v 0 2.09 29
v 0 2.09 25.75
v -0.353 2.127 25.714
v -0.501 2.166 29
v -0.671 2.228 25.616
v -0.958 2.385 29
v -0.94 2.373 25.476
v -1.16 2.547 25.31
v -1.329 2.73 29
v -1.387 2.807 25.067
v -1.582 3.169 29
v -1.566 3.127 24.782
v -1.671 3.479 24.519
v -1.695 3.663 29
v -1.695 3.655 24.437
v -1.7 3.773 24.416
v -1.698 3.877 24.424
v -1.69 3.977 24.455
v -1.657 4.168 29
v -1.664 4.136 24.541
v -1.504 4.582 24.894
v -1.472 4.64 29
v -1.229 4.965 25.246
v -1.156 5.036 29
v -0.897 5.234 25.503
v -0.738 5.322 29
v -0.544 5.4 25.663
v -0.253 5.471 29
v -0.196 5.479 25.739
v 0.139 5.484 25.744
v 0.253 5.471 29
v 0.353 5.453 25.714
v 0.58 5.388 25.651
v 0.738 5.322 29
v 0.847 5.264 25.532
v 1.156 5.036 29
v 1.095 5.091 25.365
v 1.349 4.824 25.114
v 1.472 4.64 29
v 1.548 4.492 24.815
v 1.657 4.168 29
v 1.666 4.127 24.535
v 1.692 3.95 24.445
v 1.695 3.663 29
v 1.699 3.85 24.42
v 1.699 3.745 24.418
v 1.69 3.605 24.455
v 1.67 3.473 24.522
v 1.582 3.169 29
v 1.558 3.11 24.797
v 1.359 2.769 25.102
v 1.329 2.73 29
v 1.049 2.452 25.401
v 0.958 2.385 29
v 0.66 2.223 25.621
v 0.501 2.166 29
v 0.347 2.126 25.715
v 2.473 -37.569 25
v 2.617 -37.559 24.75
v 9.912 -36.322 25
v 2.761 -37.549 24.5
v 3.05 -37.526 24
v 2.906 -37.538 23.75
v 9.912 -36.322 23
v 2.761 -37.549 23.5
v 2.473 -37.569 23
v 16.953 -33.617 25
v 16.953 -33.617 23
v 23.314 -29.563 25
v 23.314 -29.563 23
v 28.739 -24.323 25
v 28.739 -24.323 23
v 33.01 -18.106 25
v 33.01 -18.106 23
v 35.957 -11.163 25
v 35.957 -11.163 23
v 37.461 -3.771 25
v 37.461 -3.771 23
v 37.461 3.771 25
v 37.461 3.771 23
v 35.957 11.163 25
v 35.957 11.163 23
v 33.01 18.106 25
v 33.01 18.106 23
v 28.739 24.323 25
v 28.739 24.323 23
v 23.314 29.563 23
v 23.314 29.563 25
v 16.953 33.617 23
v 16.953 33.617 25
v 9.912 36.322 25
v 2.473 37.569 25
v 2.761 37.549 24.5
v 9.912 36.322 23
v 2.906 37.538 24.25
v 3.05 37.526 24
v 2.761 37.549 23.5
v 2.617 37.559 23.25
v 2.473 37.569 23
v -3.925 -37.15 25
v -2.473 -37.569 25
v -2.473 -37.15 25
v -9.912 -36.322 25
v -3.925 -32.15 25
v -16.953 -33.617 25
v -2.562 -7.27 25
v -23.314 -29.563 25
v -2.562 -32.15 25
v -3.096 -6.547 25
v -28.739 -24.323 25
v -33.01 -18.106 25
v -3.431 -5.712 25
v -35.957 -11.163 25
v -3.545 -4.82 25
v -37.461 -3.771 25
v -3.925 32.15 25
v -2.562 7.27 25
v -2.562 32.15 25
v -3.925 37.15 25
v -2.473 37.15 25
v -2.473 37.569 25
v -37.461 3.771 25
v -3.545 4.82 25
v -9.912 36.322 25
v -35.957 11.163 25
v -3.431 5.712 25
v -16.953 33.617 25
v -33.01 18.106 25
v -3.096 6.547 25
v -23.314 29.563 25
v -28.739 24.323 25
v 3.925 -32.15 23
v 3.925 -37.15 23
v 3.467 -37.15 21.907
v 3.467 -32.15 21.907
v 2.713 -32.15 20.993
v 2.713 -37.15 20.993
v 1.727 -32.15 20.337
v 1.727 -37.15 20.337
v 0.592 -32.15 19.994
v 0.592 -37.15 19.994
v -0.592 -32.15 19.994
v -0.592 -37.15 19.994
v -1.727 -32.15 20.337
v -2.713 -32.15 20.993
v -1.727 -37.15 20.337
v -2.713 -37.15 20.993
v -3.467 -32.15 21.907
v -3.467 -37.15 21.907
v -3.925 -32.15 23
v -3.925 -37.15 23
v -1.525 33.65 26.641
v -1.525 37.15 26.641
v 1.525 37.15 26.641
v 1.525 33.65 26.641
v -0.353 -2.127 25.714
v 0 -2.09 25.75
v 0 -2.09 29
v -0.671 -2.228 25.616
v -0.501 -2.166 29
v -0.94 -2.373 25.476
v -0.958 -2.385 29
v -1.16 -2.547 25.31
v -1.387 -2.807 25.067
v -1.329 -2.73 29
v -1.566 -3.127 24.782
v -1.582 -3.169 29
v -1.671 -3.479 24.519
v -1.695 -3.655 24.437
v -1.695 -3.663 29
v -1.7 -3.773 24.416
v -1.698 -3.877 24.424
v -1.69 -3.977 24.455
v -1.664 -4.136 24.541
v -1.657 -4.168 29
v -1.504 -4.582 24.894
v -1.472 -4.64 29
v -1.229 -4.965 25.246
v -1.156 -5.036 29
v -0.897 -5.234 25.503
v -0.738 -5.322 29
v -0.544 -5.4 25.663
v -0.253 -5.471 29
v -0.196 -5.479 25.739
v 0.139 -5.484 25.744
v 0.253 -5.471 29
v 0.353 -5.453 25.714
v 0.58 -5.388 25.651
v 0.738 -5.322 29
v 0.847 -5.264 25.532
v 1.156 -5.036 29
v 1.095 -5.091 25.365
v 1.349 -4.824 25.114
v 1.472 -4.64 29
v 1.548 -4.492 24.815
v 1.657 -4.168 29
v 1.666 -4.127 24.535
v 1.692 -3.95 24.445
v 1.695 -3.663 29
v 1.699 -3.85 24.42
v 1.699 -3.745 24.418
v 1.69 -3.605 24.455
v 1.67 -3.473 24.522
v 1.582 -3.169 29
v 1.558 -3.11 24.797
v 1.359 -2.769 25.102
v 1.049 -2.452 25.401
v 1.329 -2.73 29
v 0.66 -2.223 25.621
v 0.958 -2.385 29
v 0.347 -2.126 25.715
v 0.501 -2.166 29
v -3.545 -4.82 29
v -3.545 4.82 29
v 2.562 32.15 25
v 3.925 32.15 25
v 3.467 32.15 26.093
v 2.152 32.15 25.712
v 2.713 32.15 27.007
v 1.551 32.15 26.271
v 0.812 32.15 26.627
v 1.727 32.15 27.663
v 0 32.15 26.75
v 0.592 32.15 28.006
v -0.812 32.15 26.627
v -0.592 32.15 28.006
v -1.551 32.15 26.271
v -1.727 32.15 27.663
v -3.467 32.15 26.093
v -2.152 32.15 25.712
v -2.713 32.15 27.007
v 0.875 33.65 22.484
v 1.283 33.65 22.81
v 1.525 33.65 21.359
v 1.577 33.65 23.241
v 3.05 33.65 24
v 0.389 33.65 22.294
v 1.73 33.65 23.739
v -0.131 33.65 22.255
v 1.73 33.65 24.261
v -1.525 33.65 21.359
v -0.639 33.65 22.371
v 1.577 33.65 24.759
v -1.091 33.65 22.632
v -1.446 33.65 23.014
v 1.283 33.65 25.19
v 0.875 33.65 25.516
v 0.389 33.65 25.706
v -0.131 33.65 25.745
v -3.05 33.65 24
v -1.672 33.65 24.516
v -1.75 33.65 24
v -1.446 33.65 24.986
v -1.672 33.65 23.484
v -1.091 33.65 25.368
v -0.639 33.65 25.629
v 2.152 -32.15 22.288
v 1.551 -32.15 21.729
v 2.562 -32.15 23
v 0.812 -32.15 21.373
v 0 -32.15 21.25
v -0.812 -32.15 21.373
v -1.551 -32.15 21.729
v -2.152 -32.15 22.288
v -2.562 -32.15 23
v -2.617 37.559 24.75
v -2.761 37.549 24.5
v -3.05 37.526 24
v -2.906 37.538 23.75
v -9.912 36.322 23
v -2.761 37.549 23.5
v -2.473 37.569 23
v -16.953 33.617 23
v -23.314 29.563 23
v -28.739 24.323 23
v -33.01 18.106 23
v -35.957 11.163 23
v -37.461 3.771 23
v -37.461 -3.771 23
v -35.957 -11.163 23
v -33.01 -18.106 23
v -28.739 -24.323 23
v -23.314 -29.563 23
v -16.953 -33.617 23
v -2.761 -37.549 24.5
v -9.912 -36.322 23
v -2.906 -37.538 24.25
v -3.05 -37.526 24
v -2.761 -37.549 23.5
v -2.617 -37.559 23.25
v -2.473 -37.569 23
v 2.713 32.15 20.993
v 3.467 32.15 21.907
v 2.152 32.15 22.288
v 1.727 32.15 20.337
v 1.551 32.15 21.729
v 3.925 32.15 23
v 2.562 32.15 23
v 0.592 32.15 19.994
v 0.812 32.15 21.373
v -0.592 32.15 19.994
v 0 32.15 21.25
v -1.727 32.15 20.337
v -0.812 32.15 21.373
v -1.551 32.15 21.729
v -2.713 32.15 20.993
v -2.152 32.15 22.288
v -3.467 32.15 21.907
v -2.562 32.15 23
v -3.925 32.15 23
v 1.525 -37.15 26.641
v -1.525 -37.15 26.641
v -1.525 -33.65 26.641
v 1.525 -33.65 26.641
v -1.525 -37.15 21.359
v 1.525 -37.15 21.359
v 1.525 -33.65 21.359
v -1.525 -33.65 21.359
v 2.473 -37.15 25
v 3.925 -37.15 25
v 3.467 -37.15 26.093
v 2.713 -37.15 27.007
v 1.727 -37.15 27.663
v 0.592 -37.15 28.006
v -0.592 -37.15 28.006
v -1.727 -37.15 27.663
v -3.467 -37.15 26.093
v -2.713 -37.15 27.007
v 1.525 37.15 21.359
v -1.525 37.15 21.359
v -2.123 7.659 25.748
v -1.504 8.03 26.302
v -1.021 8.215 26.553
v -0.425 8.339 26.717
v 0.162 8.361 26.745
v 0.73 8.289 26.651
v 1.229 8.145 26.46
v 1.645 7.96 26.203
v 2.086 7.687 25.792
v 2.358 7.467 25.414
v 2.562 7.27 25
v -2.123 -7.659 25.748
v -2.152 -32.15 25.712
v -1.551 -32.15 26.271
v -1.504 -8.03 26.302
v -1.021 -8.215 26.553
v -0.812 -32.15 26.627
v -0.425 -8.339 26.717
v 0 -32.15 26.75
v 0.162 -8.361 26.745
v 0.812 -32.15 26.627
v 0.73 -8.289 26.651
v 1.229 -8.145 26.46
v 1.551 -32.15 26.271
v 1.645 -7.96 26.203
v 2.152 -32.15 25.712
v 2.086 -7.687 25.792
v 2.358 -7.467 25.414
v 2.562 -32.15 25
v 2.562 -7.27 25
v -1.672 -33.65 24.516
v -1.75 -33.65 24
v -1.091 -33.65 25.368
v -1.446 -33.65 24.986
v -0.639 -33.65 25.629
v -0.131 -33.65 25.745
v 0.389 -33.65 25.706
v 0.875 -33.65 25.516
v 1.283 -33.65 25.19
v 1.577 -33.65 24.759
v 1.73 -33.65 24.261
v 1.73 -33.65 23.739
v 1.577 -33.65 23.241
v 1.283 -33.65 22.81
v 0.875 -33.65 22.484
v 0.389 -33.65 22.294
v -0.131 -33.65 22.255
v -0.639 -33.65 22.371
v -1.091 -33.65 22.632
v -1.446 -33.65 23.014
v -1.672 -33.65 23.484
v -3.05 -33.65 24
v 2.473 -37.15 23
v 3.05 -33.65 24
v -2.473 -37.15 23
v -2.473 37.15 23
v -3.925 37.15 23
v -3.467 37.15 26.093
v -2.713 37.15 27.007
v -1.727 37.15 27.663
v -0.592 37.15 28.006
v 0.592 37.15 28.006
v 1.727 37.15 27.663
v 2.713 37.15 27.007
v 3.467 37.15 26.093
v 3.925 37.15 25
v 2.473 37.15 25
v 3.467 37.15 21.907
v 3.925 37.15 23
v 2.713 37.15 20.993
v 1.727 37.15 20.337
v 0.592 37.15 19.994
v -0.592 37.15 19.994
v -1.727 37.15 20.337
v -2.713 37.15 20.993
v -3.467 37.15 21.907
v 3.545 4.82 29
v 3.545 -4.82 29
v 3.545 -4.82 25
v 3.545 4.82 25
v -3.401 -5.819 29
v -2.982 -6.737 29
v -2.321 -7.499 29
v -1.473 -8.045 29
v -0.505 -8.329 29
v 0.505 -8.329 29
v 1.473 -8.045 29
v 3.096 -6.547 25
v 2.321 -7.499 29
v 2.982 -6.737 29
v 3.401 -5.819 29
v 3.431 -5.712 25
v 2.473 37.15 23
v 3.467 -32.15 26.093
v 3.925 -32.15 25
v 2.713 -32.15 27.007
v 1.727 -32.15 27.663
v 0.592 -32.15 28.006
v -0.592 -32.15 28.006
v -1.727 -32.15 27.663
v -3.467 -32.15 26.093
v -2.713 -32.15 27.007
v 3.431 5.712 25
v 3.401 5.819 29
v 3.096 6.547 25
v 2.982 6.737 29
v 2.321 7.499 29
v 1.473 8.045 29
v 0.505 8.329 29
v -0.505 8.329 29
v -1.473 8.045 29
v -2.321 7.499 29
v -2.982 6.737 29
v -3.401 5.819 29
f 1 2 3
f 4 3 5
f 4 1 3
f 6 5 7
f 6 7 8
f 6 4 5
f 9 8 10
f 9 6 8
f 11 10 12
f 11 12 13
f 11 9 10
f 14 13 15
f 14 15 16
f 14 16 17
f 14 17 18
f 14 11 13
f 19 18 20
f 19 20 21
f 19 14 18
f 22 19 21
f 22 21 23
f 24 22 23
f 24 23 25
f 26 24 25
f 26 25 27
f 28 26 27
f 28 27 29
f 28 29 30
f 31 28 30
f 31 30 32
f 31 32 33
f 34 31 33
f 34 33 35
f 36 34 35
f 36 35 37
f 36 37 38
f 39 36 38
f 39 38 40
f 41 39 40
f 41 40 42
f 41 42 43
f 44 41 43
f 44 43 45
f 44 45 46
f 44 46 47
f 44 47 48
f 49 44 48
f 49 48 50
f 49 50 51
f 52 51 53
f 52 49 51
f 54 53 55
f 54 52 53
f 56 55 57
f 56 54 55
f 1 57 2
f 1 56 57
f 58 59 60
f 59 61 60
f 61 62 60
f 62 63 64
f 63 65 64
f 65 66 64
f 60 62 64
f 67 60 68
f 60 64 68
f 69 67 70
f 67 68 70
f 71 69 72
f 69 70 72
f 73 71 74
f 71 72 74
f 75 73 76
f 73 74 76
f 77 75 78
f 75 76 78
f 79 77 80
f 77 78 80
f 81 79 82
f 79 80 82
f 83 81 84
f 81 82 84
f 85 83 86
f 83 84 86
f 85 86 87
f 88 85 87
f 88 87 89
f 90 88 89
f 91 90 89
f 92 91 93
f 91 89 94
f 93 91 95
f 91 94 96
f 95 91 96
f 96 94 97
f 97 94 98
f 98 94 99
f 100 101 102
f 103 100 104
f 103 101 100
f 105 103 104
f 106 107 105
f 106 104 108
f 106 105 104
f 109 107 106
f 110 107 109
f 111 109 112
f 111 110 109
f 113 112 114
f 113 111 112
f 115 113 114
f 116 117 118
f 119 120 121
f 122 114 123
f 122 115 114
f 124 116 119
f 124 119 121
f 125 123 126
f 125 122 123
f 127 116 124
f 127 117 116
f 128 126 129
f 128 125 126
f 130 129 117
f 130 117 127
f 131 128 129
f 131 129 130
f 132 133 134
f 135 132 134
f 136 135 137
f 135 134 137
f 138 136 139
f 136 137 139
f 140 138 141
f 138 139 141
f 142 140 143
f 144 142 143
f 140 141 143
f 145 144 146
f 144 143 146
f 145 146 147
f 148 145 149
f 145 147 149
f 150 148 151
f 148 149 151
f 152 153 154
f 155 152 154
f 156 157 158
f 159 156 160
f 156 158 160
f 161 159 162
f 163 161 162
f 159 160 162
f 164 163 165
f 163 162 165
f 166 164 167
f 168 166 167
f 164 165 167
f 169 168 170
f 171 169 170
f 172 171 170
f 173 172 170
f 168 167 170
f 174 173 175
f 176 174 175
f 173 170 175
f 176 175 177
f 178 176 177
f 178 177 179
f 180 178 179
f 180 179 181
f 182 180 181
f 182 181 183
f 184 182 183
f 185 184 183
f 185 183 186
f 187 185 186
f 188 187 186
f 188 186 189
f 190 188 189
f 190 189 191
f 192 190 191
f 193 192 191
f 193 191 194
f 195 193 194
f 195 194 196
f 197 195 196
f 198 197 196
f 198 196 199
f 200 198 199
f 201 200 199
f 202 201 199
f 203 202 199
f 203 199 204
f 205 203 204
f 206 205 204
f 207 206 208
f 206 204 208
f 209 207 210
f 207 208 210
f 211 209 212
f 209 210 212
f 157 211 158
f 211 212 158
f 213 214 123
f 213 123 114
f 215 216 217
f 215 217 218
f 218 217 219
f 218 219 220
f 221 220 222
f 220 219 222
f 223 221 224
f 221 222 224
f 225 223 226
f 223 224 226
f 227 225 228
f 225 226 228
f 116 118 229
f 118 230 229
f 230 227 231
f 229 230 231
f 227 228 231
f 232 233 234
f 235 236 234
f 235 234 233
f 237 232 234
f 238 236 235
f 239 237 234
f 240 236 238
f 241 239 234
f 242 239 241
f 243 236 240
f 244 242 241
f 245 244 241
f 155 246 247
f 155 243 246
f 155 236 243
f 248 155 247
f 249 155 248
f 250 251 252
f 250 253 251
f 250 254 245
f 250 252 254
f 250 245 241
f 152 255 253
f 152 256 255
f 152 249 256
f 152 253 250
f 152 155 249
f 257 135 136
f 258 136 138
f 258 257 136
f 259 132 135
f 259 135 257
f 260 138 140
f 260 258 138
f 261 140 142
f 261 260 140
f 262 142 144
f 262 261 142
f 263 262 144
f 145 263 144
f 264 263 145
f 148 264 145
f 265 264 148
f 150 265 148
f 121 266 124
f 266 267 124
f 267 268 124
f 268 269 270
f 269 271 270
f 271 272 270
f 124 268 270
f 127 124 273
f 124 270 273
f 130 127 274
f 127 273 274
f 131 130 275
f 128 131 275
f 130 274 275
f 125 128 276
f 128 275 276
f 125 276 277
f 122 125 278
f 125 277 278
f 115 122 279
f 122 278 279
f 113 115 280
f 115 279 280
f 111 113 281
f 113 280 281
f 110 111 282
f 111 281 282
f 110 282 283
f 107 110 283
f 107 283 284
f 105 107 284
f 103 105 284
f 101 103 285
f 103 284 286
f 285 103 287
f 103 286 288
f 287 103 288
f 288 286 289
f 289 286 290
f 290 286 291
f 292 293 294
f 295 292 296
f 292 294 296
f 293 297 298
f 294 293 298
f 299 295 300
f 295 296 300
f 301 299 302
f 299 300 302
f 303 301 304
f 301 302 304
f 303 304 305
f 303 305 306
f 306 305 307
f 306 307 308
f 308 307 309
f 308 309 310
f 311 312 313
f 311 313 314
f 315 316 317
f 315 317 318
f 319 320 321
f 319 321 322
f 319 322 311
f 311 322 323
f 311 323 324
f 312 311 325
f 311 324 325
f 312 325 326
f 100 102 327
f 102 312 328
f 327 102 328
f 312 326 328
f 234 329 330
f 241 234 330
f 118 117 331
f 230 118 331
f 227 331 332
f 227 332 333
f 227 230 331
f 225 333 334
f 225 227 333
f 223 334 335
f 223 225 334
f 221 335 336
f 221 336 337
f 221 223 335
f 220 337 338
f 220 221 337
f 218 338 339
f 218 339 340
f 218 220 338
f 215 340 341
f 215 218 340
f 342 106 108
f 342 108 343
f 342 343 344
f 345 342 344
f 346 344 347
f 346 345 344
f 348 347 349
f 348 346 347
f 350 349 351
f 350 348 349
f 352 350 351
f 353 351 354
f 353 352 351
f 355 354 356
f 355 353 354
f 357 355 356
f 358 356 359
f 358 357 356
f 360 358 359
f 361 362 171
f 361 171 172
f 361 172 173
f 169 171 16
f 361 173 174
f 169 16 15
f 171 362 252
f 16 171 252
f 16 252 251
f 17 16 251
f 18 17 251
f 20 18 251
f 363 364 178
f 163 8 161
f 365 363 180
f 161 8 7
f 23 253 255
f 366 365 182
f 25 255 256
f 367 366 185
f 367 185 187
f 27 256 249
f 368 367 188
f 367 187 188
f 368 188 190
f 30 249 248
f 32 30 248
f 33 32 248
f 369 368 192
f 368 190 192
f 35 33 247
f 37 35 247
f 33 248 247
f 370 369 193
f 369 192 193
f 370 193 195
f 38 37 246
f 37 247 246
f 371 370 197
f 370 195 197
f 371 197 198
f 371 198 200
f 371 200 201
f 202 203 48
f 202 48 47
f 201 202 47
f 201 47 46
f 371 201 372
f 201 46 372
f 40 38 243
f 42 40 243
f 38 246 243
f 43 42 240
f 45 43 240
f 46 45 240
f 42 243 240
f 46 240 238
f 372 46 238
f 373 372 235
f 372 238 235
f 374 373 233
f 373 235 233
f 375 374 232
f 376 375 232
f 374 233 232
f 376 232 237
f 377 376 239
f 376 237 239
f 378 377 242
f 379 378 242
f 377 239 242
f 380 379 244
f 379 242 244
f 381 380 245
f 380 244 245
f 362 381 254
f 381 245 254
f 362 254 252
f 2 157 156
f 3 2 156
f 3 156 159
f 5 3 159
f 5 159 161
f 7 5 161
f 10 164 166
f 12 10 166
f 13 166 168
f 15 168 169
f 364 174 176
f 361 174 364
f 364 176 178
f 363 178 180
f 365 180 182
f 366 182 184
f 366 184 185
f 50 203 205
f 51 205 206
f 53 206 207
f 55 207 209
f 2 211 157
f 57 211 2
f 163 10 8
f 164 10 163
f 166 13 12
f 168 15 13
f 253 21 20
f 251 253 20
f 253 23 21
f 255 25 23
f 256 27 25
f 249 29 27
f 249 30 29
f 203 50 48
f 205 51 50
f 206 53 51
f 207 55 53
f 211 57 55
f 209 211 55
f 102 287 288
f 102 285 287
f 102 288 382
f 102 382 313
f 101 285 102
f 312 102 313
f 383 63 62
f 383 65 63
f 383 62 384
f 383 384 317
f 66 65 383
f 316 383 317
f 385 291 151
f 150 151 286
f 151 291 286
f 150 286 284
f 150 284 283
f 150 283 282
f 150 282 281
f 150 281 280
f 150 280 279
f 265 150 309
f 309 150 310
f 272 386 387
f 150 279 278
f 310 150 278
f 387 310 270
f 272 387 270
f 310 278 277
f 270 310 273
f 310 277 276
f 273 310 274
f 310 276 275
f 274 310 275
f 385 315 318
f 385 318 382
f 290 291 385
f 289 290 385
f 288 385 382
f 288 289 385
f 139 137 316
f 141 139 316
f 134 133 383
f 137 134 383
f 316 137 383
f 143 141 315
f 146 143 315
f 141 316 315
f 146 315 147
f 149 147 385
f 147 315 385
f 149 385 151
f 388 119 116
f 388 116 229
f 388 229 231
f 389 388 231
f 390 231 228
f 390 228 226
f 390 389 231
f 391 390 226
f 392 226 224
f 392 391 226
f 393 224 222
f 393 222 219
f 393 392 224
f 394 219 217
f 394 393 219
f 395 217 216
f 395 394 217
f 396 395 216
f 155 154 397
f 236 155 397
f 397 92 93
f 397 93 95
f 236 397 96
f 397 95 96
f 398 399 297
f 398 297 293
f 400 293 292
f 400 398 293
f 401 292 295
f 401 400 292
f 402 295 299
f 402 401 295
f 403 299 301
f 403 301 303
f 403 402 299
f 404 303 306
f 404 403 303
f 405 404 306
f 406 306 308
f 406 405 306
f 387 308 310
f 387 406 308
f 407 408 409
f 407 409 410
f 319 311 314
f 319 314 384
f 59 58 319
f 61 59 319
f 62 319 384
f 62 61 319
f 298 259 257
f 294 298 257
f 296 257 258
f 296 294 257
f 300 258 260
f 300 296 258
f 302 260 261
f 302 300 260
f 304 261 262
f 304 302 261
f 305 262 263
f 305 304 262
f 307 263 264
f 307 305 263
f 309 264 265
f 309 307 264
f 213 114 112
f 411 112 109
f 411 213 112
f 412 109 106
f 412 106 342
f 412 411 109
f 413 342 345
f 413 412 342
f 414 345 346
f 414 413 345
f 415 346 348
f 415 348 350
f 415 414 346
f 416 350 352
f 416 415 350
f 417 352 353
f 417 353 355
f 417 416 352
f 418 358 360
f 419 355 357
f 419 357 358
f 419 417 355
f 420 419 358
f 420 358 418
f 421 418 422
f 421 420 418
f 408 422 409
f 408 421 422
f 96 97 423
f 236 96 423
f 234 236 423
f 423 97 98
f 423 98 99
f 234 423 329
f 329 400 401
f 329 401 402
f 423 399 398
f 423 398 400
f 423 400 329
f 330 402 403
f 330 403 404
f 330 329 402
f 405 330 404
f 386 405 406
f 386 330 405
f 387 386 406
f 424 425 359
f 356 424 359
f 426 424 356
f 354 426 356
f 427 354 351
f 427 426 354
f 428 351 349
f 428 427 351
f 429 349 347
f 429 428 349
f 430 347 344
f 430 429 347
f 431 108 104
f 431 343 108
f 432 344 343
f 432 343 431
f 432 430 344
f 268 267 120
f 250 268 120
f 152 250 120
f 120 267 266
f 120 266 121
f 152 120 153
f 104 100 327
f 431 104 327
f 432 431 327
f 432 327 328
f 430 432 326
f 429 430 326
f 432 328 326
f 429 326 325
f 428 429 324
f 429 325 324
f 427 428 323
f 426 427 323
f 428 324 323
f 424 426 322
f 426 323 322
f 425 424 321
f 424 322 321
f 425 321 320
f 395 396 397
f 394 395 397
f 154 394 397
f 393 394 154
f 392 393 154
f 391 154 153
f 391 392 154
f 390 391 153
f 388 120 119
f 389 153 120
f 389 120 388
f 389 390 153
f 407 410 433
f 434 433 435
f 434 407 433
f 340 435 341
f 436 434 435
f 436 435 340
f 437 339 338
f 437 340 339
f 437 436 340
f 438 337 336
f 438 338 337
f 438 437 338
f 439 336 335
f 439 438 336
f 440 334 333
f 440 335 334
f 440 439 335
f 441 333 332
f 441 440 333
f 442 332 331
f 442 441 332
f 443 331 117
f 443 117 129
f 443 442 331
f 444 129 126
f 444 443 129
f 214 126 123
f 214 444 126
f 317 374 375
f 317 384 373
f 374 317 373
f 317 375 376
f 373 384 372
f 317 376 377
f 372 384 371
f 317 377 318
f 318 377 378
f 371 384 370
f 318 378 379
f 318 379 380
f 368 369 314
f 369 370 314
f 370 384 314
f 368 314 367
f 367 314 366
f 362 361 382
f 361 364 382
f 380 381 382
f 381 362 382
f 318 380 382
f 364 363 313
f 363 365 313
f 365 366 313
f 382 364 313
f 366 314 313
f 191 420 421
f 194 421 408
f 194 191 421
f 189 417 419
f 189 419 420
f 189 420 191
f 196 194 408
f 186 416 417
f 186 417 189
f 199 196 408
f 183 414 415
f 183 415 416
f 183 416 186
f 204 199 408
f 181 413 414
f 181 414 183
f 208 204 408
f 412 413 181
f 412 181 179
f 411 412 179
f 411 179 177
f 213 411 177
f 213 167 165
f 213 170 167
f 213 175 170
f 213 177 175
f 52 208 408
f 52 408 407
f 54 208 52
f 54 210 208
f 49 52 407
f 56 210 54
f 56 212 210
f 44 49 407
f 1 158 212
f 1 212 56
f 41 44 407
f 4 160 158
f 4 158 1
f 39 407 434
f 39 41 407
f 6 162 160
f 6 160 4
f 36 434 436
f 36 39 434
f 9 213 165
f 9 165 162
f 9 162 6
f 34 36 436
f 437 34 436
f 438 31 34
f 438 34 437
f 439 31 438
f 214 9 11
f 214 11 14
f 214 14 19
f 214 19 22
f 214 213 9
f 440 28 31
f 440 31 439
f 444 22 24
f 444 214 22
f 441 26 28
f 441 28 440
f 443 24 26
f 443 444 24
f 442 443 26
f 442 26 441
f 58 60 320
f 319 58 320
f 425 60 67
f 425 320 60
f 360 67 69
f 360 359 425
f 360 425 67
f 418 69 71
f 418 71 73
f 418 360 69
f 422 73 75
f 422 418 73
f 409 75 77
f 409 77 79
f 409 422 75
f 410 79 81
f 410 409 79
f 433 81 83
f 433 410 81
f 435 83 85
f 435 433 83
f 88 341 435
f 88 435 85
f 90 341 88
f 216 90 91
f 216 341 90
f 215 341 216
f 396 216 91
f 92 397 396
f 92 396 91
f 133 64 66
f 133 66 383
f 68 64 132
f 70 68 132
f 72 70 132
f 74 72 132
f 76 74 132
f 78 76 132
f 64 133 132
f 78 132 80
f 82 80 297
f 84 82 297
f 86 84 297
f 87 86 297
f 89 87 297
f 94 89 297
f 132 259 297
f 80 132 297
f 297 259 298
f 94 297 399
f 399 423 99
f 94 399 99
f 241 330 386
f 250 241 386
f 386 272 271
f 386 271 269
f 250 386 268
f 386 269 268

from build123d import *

# Parameters (mm, degrees)
SKETCH004_R             = 37.65
PAD002_DEPTH            = 2
SKETCH005_R             = 2.75
SKETCH005_R_2           = 1.75
PAD003_DEPTH            = 32.65
SKETCH007_R             = 4.05
PAD004_DEPTH            = 5
POCKET_DEPTH            = 4
PAD014_DEPTH            = 4
SKETCH006_R             = 1.75
POCKET003012_DEPTH      = 75.219717
SKETCH036_R             = 1.7
POCKET003013_DEPTH      = 5
BODY001_PLACEMENT_ANGLE = 90


with BuildPart() as part:
    # Sketch004 → Pad002 (new body)
    with BuildSketch(Plane.XY):
        Circle(SKETCH004_R)
    extrude(amount=PAD002_DEPTH)

    # Sketch005 → Pad003 (join, symmetric)
    with BuildSketch(Plane(origin=(0, 0, 1), x_dir=(0, 1, 0), z_dir=(1, 0, 0))):
        Circle(SKETCH005_R)
        Circle(SKETCH005_R_2, mode=Mode.SUBTRACT)
    extrude(amount=PAD003_DEPTH, both=True)

    # Sketch007 → Pad004 (join)
    with BuildSketch(Plane(origin=(37.15, 0, 1), x_dir=(0, 1, 0), z_dir=(1, 0, 0))):
        Circle(SKETCH007_R)
    pad004 = extrude(amount=-PAD004_DEPTH)

    # Mirrored: Pad004 across YZ
    add(pad004.mirror(Plane.YZ))

    # Sketch008 → Pocket (cut)
    with BuildSketch(Plane(origin=(37.65, 0, 1), x_dir=(0, 1, 0), z_dir=(1, 0, 0))):
        Polygon((1.525, -2.641377), (3.05, 0), (1.525, 2.641377), (-1.525, 2.641377), (-3.05, 0), (-1.525, -2.641377), align=None)
    pocket = extrude(amount=-POCKET_DEPTH, mode=Mode.SUBTRACT)

    # Mirrored001: Pocket across YZ
    add(pocket.mirror(Plane.YZ), mode=Mode.SUBTRACT)

    # Sketch035 → Pad014 (join)
    with BuildSketch(Plane.XY.offset(6)):
        with BuildLine():
            ThreePointArc((-4.82, 3.545), (-8.365, 0), (-4.82, -3.545))
            Line((-4.82, -3.545), (4.82, -3.545))
            ThreePointArc((4.82, -3.545), (8.365, 0), (4.82, 3.545))
            Line((4.82, 3.545), (-4.82, 3.545))
        make_face()
    extrude(amount=-PAD014_DEPTH)

    # Sketch006 → Pocket003012 (cut, through all)
    with BuildSketch(Plane(origin=(37.65, 0, 1), x_dir=(0, 1, 0), z_dir=(1, 0, 0))):
        Circle(SKETCH006_R)
    extrude(amount=-POCKET003012_DEPTH, mode=Mode.SUBTRACT)

    # Sketch036 → Pocket003013 (cut)
    with BuildSketch(Plane.XY.offset(6)):
        with Locations((-3.79, 0)):
            Circle(SKETCH036_R)
    pocket003013 = extrude(amount=-POCKET003013_DEPTH, mode=Mode.SUBTRACT)

    # Mirrored002: Pocket003013 across Sketch036 V_Axis
    add(pocket003013.mirror(Plane(origin=(0, 0, 6), x_dir=(0, 0, 1), z_dir=(1, 0, 0))), mode=Mode.SUBTRACT)


with BuildPart() as part_1:
    # Body001 placement: moved
    add(part.part.moved(Location((0, 0, 23))).rotate(Axis((0, 0, 23), (0, 0, 1)), BODY001_PLACEMENT_ANGLE))


solid = part_1.part
